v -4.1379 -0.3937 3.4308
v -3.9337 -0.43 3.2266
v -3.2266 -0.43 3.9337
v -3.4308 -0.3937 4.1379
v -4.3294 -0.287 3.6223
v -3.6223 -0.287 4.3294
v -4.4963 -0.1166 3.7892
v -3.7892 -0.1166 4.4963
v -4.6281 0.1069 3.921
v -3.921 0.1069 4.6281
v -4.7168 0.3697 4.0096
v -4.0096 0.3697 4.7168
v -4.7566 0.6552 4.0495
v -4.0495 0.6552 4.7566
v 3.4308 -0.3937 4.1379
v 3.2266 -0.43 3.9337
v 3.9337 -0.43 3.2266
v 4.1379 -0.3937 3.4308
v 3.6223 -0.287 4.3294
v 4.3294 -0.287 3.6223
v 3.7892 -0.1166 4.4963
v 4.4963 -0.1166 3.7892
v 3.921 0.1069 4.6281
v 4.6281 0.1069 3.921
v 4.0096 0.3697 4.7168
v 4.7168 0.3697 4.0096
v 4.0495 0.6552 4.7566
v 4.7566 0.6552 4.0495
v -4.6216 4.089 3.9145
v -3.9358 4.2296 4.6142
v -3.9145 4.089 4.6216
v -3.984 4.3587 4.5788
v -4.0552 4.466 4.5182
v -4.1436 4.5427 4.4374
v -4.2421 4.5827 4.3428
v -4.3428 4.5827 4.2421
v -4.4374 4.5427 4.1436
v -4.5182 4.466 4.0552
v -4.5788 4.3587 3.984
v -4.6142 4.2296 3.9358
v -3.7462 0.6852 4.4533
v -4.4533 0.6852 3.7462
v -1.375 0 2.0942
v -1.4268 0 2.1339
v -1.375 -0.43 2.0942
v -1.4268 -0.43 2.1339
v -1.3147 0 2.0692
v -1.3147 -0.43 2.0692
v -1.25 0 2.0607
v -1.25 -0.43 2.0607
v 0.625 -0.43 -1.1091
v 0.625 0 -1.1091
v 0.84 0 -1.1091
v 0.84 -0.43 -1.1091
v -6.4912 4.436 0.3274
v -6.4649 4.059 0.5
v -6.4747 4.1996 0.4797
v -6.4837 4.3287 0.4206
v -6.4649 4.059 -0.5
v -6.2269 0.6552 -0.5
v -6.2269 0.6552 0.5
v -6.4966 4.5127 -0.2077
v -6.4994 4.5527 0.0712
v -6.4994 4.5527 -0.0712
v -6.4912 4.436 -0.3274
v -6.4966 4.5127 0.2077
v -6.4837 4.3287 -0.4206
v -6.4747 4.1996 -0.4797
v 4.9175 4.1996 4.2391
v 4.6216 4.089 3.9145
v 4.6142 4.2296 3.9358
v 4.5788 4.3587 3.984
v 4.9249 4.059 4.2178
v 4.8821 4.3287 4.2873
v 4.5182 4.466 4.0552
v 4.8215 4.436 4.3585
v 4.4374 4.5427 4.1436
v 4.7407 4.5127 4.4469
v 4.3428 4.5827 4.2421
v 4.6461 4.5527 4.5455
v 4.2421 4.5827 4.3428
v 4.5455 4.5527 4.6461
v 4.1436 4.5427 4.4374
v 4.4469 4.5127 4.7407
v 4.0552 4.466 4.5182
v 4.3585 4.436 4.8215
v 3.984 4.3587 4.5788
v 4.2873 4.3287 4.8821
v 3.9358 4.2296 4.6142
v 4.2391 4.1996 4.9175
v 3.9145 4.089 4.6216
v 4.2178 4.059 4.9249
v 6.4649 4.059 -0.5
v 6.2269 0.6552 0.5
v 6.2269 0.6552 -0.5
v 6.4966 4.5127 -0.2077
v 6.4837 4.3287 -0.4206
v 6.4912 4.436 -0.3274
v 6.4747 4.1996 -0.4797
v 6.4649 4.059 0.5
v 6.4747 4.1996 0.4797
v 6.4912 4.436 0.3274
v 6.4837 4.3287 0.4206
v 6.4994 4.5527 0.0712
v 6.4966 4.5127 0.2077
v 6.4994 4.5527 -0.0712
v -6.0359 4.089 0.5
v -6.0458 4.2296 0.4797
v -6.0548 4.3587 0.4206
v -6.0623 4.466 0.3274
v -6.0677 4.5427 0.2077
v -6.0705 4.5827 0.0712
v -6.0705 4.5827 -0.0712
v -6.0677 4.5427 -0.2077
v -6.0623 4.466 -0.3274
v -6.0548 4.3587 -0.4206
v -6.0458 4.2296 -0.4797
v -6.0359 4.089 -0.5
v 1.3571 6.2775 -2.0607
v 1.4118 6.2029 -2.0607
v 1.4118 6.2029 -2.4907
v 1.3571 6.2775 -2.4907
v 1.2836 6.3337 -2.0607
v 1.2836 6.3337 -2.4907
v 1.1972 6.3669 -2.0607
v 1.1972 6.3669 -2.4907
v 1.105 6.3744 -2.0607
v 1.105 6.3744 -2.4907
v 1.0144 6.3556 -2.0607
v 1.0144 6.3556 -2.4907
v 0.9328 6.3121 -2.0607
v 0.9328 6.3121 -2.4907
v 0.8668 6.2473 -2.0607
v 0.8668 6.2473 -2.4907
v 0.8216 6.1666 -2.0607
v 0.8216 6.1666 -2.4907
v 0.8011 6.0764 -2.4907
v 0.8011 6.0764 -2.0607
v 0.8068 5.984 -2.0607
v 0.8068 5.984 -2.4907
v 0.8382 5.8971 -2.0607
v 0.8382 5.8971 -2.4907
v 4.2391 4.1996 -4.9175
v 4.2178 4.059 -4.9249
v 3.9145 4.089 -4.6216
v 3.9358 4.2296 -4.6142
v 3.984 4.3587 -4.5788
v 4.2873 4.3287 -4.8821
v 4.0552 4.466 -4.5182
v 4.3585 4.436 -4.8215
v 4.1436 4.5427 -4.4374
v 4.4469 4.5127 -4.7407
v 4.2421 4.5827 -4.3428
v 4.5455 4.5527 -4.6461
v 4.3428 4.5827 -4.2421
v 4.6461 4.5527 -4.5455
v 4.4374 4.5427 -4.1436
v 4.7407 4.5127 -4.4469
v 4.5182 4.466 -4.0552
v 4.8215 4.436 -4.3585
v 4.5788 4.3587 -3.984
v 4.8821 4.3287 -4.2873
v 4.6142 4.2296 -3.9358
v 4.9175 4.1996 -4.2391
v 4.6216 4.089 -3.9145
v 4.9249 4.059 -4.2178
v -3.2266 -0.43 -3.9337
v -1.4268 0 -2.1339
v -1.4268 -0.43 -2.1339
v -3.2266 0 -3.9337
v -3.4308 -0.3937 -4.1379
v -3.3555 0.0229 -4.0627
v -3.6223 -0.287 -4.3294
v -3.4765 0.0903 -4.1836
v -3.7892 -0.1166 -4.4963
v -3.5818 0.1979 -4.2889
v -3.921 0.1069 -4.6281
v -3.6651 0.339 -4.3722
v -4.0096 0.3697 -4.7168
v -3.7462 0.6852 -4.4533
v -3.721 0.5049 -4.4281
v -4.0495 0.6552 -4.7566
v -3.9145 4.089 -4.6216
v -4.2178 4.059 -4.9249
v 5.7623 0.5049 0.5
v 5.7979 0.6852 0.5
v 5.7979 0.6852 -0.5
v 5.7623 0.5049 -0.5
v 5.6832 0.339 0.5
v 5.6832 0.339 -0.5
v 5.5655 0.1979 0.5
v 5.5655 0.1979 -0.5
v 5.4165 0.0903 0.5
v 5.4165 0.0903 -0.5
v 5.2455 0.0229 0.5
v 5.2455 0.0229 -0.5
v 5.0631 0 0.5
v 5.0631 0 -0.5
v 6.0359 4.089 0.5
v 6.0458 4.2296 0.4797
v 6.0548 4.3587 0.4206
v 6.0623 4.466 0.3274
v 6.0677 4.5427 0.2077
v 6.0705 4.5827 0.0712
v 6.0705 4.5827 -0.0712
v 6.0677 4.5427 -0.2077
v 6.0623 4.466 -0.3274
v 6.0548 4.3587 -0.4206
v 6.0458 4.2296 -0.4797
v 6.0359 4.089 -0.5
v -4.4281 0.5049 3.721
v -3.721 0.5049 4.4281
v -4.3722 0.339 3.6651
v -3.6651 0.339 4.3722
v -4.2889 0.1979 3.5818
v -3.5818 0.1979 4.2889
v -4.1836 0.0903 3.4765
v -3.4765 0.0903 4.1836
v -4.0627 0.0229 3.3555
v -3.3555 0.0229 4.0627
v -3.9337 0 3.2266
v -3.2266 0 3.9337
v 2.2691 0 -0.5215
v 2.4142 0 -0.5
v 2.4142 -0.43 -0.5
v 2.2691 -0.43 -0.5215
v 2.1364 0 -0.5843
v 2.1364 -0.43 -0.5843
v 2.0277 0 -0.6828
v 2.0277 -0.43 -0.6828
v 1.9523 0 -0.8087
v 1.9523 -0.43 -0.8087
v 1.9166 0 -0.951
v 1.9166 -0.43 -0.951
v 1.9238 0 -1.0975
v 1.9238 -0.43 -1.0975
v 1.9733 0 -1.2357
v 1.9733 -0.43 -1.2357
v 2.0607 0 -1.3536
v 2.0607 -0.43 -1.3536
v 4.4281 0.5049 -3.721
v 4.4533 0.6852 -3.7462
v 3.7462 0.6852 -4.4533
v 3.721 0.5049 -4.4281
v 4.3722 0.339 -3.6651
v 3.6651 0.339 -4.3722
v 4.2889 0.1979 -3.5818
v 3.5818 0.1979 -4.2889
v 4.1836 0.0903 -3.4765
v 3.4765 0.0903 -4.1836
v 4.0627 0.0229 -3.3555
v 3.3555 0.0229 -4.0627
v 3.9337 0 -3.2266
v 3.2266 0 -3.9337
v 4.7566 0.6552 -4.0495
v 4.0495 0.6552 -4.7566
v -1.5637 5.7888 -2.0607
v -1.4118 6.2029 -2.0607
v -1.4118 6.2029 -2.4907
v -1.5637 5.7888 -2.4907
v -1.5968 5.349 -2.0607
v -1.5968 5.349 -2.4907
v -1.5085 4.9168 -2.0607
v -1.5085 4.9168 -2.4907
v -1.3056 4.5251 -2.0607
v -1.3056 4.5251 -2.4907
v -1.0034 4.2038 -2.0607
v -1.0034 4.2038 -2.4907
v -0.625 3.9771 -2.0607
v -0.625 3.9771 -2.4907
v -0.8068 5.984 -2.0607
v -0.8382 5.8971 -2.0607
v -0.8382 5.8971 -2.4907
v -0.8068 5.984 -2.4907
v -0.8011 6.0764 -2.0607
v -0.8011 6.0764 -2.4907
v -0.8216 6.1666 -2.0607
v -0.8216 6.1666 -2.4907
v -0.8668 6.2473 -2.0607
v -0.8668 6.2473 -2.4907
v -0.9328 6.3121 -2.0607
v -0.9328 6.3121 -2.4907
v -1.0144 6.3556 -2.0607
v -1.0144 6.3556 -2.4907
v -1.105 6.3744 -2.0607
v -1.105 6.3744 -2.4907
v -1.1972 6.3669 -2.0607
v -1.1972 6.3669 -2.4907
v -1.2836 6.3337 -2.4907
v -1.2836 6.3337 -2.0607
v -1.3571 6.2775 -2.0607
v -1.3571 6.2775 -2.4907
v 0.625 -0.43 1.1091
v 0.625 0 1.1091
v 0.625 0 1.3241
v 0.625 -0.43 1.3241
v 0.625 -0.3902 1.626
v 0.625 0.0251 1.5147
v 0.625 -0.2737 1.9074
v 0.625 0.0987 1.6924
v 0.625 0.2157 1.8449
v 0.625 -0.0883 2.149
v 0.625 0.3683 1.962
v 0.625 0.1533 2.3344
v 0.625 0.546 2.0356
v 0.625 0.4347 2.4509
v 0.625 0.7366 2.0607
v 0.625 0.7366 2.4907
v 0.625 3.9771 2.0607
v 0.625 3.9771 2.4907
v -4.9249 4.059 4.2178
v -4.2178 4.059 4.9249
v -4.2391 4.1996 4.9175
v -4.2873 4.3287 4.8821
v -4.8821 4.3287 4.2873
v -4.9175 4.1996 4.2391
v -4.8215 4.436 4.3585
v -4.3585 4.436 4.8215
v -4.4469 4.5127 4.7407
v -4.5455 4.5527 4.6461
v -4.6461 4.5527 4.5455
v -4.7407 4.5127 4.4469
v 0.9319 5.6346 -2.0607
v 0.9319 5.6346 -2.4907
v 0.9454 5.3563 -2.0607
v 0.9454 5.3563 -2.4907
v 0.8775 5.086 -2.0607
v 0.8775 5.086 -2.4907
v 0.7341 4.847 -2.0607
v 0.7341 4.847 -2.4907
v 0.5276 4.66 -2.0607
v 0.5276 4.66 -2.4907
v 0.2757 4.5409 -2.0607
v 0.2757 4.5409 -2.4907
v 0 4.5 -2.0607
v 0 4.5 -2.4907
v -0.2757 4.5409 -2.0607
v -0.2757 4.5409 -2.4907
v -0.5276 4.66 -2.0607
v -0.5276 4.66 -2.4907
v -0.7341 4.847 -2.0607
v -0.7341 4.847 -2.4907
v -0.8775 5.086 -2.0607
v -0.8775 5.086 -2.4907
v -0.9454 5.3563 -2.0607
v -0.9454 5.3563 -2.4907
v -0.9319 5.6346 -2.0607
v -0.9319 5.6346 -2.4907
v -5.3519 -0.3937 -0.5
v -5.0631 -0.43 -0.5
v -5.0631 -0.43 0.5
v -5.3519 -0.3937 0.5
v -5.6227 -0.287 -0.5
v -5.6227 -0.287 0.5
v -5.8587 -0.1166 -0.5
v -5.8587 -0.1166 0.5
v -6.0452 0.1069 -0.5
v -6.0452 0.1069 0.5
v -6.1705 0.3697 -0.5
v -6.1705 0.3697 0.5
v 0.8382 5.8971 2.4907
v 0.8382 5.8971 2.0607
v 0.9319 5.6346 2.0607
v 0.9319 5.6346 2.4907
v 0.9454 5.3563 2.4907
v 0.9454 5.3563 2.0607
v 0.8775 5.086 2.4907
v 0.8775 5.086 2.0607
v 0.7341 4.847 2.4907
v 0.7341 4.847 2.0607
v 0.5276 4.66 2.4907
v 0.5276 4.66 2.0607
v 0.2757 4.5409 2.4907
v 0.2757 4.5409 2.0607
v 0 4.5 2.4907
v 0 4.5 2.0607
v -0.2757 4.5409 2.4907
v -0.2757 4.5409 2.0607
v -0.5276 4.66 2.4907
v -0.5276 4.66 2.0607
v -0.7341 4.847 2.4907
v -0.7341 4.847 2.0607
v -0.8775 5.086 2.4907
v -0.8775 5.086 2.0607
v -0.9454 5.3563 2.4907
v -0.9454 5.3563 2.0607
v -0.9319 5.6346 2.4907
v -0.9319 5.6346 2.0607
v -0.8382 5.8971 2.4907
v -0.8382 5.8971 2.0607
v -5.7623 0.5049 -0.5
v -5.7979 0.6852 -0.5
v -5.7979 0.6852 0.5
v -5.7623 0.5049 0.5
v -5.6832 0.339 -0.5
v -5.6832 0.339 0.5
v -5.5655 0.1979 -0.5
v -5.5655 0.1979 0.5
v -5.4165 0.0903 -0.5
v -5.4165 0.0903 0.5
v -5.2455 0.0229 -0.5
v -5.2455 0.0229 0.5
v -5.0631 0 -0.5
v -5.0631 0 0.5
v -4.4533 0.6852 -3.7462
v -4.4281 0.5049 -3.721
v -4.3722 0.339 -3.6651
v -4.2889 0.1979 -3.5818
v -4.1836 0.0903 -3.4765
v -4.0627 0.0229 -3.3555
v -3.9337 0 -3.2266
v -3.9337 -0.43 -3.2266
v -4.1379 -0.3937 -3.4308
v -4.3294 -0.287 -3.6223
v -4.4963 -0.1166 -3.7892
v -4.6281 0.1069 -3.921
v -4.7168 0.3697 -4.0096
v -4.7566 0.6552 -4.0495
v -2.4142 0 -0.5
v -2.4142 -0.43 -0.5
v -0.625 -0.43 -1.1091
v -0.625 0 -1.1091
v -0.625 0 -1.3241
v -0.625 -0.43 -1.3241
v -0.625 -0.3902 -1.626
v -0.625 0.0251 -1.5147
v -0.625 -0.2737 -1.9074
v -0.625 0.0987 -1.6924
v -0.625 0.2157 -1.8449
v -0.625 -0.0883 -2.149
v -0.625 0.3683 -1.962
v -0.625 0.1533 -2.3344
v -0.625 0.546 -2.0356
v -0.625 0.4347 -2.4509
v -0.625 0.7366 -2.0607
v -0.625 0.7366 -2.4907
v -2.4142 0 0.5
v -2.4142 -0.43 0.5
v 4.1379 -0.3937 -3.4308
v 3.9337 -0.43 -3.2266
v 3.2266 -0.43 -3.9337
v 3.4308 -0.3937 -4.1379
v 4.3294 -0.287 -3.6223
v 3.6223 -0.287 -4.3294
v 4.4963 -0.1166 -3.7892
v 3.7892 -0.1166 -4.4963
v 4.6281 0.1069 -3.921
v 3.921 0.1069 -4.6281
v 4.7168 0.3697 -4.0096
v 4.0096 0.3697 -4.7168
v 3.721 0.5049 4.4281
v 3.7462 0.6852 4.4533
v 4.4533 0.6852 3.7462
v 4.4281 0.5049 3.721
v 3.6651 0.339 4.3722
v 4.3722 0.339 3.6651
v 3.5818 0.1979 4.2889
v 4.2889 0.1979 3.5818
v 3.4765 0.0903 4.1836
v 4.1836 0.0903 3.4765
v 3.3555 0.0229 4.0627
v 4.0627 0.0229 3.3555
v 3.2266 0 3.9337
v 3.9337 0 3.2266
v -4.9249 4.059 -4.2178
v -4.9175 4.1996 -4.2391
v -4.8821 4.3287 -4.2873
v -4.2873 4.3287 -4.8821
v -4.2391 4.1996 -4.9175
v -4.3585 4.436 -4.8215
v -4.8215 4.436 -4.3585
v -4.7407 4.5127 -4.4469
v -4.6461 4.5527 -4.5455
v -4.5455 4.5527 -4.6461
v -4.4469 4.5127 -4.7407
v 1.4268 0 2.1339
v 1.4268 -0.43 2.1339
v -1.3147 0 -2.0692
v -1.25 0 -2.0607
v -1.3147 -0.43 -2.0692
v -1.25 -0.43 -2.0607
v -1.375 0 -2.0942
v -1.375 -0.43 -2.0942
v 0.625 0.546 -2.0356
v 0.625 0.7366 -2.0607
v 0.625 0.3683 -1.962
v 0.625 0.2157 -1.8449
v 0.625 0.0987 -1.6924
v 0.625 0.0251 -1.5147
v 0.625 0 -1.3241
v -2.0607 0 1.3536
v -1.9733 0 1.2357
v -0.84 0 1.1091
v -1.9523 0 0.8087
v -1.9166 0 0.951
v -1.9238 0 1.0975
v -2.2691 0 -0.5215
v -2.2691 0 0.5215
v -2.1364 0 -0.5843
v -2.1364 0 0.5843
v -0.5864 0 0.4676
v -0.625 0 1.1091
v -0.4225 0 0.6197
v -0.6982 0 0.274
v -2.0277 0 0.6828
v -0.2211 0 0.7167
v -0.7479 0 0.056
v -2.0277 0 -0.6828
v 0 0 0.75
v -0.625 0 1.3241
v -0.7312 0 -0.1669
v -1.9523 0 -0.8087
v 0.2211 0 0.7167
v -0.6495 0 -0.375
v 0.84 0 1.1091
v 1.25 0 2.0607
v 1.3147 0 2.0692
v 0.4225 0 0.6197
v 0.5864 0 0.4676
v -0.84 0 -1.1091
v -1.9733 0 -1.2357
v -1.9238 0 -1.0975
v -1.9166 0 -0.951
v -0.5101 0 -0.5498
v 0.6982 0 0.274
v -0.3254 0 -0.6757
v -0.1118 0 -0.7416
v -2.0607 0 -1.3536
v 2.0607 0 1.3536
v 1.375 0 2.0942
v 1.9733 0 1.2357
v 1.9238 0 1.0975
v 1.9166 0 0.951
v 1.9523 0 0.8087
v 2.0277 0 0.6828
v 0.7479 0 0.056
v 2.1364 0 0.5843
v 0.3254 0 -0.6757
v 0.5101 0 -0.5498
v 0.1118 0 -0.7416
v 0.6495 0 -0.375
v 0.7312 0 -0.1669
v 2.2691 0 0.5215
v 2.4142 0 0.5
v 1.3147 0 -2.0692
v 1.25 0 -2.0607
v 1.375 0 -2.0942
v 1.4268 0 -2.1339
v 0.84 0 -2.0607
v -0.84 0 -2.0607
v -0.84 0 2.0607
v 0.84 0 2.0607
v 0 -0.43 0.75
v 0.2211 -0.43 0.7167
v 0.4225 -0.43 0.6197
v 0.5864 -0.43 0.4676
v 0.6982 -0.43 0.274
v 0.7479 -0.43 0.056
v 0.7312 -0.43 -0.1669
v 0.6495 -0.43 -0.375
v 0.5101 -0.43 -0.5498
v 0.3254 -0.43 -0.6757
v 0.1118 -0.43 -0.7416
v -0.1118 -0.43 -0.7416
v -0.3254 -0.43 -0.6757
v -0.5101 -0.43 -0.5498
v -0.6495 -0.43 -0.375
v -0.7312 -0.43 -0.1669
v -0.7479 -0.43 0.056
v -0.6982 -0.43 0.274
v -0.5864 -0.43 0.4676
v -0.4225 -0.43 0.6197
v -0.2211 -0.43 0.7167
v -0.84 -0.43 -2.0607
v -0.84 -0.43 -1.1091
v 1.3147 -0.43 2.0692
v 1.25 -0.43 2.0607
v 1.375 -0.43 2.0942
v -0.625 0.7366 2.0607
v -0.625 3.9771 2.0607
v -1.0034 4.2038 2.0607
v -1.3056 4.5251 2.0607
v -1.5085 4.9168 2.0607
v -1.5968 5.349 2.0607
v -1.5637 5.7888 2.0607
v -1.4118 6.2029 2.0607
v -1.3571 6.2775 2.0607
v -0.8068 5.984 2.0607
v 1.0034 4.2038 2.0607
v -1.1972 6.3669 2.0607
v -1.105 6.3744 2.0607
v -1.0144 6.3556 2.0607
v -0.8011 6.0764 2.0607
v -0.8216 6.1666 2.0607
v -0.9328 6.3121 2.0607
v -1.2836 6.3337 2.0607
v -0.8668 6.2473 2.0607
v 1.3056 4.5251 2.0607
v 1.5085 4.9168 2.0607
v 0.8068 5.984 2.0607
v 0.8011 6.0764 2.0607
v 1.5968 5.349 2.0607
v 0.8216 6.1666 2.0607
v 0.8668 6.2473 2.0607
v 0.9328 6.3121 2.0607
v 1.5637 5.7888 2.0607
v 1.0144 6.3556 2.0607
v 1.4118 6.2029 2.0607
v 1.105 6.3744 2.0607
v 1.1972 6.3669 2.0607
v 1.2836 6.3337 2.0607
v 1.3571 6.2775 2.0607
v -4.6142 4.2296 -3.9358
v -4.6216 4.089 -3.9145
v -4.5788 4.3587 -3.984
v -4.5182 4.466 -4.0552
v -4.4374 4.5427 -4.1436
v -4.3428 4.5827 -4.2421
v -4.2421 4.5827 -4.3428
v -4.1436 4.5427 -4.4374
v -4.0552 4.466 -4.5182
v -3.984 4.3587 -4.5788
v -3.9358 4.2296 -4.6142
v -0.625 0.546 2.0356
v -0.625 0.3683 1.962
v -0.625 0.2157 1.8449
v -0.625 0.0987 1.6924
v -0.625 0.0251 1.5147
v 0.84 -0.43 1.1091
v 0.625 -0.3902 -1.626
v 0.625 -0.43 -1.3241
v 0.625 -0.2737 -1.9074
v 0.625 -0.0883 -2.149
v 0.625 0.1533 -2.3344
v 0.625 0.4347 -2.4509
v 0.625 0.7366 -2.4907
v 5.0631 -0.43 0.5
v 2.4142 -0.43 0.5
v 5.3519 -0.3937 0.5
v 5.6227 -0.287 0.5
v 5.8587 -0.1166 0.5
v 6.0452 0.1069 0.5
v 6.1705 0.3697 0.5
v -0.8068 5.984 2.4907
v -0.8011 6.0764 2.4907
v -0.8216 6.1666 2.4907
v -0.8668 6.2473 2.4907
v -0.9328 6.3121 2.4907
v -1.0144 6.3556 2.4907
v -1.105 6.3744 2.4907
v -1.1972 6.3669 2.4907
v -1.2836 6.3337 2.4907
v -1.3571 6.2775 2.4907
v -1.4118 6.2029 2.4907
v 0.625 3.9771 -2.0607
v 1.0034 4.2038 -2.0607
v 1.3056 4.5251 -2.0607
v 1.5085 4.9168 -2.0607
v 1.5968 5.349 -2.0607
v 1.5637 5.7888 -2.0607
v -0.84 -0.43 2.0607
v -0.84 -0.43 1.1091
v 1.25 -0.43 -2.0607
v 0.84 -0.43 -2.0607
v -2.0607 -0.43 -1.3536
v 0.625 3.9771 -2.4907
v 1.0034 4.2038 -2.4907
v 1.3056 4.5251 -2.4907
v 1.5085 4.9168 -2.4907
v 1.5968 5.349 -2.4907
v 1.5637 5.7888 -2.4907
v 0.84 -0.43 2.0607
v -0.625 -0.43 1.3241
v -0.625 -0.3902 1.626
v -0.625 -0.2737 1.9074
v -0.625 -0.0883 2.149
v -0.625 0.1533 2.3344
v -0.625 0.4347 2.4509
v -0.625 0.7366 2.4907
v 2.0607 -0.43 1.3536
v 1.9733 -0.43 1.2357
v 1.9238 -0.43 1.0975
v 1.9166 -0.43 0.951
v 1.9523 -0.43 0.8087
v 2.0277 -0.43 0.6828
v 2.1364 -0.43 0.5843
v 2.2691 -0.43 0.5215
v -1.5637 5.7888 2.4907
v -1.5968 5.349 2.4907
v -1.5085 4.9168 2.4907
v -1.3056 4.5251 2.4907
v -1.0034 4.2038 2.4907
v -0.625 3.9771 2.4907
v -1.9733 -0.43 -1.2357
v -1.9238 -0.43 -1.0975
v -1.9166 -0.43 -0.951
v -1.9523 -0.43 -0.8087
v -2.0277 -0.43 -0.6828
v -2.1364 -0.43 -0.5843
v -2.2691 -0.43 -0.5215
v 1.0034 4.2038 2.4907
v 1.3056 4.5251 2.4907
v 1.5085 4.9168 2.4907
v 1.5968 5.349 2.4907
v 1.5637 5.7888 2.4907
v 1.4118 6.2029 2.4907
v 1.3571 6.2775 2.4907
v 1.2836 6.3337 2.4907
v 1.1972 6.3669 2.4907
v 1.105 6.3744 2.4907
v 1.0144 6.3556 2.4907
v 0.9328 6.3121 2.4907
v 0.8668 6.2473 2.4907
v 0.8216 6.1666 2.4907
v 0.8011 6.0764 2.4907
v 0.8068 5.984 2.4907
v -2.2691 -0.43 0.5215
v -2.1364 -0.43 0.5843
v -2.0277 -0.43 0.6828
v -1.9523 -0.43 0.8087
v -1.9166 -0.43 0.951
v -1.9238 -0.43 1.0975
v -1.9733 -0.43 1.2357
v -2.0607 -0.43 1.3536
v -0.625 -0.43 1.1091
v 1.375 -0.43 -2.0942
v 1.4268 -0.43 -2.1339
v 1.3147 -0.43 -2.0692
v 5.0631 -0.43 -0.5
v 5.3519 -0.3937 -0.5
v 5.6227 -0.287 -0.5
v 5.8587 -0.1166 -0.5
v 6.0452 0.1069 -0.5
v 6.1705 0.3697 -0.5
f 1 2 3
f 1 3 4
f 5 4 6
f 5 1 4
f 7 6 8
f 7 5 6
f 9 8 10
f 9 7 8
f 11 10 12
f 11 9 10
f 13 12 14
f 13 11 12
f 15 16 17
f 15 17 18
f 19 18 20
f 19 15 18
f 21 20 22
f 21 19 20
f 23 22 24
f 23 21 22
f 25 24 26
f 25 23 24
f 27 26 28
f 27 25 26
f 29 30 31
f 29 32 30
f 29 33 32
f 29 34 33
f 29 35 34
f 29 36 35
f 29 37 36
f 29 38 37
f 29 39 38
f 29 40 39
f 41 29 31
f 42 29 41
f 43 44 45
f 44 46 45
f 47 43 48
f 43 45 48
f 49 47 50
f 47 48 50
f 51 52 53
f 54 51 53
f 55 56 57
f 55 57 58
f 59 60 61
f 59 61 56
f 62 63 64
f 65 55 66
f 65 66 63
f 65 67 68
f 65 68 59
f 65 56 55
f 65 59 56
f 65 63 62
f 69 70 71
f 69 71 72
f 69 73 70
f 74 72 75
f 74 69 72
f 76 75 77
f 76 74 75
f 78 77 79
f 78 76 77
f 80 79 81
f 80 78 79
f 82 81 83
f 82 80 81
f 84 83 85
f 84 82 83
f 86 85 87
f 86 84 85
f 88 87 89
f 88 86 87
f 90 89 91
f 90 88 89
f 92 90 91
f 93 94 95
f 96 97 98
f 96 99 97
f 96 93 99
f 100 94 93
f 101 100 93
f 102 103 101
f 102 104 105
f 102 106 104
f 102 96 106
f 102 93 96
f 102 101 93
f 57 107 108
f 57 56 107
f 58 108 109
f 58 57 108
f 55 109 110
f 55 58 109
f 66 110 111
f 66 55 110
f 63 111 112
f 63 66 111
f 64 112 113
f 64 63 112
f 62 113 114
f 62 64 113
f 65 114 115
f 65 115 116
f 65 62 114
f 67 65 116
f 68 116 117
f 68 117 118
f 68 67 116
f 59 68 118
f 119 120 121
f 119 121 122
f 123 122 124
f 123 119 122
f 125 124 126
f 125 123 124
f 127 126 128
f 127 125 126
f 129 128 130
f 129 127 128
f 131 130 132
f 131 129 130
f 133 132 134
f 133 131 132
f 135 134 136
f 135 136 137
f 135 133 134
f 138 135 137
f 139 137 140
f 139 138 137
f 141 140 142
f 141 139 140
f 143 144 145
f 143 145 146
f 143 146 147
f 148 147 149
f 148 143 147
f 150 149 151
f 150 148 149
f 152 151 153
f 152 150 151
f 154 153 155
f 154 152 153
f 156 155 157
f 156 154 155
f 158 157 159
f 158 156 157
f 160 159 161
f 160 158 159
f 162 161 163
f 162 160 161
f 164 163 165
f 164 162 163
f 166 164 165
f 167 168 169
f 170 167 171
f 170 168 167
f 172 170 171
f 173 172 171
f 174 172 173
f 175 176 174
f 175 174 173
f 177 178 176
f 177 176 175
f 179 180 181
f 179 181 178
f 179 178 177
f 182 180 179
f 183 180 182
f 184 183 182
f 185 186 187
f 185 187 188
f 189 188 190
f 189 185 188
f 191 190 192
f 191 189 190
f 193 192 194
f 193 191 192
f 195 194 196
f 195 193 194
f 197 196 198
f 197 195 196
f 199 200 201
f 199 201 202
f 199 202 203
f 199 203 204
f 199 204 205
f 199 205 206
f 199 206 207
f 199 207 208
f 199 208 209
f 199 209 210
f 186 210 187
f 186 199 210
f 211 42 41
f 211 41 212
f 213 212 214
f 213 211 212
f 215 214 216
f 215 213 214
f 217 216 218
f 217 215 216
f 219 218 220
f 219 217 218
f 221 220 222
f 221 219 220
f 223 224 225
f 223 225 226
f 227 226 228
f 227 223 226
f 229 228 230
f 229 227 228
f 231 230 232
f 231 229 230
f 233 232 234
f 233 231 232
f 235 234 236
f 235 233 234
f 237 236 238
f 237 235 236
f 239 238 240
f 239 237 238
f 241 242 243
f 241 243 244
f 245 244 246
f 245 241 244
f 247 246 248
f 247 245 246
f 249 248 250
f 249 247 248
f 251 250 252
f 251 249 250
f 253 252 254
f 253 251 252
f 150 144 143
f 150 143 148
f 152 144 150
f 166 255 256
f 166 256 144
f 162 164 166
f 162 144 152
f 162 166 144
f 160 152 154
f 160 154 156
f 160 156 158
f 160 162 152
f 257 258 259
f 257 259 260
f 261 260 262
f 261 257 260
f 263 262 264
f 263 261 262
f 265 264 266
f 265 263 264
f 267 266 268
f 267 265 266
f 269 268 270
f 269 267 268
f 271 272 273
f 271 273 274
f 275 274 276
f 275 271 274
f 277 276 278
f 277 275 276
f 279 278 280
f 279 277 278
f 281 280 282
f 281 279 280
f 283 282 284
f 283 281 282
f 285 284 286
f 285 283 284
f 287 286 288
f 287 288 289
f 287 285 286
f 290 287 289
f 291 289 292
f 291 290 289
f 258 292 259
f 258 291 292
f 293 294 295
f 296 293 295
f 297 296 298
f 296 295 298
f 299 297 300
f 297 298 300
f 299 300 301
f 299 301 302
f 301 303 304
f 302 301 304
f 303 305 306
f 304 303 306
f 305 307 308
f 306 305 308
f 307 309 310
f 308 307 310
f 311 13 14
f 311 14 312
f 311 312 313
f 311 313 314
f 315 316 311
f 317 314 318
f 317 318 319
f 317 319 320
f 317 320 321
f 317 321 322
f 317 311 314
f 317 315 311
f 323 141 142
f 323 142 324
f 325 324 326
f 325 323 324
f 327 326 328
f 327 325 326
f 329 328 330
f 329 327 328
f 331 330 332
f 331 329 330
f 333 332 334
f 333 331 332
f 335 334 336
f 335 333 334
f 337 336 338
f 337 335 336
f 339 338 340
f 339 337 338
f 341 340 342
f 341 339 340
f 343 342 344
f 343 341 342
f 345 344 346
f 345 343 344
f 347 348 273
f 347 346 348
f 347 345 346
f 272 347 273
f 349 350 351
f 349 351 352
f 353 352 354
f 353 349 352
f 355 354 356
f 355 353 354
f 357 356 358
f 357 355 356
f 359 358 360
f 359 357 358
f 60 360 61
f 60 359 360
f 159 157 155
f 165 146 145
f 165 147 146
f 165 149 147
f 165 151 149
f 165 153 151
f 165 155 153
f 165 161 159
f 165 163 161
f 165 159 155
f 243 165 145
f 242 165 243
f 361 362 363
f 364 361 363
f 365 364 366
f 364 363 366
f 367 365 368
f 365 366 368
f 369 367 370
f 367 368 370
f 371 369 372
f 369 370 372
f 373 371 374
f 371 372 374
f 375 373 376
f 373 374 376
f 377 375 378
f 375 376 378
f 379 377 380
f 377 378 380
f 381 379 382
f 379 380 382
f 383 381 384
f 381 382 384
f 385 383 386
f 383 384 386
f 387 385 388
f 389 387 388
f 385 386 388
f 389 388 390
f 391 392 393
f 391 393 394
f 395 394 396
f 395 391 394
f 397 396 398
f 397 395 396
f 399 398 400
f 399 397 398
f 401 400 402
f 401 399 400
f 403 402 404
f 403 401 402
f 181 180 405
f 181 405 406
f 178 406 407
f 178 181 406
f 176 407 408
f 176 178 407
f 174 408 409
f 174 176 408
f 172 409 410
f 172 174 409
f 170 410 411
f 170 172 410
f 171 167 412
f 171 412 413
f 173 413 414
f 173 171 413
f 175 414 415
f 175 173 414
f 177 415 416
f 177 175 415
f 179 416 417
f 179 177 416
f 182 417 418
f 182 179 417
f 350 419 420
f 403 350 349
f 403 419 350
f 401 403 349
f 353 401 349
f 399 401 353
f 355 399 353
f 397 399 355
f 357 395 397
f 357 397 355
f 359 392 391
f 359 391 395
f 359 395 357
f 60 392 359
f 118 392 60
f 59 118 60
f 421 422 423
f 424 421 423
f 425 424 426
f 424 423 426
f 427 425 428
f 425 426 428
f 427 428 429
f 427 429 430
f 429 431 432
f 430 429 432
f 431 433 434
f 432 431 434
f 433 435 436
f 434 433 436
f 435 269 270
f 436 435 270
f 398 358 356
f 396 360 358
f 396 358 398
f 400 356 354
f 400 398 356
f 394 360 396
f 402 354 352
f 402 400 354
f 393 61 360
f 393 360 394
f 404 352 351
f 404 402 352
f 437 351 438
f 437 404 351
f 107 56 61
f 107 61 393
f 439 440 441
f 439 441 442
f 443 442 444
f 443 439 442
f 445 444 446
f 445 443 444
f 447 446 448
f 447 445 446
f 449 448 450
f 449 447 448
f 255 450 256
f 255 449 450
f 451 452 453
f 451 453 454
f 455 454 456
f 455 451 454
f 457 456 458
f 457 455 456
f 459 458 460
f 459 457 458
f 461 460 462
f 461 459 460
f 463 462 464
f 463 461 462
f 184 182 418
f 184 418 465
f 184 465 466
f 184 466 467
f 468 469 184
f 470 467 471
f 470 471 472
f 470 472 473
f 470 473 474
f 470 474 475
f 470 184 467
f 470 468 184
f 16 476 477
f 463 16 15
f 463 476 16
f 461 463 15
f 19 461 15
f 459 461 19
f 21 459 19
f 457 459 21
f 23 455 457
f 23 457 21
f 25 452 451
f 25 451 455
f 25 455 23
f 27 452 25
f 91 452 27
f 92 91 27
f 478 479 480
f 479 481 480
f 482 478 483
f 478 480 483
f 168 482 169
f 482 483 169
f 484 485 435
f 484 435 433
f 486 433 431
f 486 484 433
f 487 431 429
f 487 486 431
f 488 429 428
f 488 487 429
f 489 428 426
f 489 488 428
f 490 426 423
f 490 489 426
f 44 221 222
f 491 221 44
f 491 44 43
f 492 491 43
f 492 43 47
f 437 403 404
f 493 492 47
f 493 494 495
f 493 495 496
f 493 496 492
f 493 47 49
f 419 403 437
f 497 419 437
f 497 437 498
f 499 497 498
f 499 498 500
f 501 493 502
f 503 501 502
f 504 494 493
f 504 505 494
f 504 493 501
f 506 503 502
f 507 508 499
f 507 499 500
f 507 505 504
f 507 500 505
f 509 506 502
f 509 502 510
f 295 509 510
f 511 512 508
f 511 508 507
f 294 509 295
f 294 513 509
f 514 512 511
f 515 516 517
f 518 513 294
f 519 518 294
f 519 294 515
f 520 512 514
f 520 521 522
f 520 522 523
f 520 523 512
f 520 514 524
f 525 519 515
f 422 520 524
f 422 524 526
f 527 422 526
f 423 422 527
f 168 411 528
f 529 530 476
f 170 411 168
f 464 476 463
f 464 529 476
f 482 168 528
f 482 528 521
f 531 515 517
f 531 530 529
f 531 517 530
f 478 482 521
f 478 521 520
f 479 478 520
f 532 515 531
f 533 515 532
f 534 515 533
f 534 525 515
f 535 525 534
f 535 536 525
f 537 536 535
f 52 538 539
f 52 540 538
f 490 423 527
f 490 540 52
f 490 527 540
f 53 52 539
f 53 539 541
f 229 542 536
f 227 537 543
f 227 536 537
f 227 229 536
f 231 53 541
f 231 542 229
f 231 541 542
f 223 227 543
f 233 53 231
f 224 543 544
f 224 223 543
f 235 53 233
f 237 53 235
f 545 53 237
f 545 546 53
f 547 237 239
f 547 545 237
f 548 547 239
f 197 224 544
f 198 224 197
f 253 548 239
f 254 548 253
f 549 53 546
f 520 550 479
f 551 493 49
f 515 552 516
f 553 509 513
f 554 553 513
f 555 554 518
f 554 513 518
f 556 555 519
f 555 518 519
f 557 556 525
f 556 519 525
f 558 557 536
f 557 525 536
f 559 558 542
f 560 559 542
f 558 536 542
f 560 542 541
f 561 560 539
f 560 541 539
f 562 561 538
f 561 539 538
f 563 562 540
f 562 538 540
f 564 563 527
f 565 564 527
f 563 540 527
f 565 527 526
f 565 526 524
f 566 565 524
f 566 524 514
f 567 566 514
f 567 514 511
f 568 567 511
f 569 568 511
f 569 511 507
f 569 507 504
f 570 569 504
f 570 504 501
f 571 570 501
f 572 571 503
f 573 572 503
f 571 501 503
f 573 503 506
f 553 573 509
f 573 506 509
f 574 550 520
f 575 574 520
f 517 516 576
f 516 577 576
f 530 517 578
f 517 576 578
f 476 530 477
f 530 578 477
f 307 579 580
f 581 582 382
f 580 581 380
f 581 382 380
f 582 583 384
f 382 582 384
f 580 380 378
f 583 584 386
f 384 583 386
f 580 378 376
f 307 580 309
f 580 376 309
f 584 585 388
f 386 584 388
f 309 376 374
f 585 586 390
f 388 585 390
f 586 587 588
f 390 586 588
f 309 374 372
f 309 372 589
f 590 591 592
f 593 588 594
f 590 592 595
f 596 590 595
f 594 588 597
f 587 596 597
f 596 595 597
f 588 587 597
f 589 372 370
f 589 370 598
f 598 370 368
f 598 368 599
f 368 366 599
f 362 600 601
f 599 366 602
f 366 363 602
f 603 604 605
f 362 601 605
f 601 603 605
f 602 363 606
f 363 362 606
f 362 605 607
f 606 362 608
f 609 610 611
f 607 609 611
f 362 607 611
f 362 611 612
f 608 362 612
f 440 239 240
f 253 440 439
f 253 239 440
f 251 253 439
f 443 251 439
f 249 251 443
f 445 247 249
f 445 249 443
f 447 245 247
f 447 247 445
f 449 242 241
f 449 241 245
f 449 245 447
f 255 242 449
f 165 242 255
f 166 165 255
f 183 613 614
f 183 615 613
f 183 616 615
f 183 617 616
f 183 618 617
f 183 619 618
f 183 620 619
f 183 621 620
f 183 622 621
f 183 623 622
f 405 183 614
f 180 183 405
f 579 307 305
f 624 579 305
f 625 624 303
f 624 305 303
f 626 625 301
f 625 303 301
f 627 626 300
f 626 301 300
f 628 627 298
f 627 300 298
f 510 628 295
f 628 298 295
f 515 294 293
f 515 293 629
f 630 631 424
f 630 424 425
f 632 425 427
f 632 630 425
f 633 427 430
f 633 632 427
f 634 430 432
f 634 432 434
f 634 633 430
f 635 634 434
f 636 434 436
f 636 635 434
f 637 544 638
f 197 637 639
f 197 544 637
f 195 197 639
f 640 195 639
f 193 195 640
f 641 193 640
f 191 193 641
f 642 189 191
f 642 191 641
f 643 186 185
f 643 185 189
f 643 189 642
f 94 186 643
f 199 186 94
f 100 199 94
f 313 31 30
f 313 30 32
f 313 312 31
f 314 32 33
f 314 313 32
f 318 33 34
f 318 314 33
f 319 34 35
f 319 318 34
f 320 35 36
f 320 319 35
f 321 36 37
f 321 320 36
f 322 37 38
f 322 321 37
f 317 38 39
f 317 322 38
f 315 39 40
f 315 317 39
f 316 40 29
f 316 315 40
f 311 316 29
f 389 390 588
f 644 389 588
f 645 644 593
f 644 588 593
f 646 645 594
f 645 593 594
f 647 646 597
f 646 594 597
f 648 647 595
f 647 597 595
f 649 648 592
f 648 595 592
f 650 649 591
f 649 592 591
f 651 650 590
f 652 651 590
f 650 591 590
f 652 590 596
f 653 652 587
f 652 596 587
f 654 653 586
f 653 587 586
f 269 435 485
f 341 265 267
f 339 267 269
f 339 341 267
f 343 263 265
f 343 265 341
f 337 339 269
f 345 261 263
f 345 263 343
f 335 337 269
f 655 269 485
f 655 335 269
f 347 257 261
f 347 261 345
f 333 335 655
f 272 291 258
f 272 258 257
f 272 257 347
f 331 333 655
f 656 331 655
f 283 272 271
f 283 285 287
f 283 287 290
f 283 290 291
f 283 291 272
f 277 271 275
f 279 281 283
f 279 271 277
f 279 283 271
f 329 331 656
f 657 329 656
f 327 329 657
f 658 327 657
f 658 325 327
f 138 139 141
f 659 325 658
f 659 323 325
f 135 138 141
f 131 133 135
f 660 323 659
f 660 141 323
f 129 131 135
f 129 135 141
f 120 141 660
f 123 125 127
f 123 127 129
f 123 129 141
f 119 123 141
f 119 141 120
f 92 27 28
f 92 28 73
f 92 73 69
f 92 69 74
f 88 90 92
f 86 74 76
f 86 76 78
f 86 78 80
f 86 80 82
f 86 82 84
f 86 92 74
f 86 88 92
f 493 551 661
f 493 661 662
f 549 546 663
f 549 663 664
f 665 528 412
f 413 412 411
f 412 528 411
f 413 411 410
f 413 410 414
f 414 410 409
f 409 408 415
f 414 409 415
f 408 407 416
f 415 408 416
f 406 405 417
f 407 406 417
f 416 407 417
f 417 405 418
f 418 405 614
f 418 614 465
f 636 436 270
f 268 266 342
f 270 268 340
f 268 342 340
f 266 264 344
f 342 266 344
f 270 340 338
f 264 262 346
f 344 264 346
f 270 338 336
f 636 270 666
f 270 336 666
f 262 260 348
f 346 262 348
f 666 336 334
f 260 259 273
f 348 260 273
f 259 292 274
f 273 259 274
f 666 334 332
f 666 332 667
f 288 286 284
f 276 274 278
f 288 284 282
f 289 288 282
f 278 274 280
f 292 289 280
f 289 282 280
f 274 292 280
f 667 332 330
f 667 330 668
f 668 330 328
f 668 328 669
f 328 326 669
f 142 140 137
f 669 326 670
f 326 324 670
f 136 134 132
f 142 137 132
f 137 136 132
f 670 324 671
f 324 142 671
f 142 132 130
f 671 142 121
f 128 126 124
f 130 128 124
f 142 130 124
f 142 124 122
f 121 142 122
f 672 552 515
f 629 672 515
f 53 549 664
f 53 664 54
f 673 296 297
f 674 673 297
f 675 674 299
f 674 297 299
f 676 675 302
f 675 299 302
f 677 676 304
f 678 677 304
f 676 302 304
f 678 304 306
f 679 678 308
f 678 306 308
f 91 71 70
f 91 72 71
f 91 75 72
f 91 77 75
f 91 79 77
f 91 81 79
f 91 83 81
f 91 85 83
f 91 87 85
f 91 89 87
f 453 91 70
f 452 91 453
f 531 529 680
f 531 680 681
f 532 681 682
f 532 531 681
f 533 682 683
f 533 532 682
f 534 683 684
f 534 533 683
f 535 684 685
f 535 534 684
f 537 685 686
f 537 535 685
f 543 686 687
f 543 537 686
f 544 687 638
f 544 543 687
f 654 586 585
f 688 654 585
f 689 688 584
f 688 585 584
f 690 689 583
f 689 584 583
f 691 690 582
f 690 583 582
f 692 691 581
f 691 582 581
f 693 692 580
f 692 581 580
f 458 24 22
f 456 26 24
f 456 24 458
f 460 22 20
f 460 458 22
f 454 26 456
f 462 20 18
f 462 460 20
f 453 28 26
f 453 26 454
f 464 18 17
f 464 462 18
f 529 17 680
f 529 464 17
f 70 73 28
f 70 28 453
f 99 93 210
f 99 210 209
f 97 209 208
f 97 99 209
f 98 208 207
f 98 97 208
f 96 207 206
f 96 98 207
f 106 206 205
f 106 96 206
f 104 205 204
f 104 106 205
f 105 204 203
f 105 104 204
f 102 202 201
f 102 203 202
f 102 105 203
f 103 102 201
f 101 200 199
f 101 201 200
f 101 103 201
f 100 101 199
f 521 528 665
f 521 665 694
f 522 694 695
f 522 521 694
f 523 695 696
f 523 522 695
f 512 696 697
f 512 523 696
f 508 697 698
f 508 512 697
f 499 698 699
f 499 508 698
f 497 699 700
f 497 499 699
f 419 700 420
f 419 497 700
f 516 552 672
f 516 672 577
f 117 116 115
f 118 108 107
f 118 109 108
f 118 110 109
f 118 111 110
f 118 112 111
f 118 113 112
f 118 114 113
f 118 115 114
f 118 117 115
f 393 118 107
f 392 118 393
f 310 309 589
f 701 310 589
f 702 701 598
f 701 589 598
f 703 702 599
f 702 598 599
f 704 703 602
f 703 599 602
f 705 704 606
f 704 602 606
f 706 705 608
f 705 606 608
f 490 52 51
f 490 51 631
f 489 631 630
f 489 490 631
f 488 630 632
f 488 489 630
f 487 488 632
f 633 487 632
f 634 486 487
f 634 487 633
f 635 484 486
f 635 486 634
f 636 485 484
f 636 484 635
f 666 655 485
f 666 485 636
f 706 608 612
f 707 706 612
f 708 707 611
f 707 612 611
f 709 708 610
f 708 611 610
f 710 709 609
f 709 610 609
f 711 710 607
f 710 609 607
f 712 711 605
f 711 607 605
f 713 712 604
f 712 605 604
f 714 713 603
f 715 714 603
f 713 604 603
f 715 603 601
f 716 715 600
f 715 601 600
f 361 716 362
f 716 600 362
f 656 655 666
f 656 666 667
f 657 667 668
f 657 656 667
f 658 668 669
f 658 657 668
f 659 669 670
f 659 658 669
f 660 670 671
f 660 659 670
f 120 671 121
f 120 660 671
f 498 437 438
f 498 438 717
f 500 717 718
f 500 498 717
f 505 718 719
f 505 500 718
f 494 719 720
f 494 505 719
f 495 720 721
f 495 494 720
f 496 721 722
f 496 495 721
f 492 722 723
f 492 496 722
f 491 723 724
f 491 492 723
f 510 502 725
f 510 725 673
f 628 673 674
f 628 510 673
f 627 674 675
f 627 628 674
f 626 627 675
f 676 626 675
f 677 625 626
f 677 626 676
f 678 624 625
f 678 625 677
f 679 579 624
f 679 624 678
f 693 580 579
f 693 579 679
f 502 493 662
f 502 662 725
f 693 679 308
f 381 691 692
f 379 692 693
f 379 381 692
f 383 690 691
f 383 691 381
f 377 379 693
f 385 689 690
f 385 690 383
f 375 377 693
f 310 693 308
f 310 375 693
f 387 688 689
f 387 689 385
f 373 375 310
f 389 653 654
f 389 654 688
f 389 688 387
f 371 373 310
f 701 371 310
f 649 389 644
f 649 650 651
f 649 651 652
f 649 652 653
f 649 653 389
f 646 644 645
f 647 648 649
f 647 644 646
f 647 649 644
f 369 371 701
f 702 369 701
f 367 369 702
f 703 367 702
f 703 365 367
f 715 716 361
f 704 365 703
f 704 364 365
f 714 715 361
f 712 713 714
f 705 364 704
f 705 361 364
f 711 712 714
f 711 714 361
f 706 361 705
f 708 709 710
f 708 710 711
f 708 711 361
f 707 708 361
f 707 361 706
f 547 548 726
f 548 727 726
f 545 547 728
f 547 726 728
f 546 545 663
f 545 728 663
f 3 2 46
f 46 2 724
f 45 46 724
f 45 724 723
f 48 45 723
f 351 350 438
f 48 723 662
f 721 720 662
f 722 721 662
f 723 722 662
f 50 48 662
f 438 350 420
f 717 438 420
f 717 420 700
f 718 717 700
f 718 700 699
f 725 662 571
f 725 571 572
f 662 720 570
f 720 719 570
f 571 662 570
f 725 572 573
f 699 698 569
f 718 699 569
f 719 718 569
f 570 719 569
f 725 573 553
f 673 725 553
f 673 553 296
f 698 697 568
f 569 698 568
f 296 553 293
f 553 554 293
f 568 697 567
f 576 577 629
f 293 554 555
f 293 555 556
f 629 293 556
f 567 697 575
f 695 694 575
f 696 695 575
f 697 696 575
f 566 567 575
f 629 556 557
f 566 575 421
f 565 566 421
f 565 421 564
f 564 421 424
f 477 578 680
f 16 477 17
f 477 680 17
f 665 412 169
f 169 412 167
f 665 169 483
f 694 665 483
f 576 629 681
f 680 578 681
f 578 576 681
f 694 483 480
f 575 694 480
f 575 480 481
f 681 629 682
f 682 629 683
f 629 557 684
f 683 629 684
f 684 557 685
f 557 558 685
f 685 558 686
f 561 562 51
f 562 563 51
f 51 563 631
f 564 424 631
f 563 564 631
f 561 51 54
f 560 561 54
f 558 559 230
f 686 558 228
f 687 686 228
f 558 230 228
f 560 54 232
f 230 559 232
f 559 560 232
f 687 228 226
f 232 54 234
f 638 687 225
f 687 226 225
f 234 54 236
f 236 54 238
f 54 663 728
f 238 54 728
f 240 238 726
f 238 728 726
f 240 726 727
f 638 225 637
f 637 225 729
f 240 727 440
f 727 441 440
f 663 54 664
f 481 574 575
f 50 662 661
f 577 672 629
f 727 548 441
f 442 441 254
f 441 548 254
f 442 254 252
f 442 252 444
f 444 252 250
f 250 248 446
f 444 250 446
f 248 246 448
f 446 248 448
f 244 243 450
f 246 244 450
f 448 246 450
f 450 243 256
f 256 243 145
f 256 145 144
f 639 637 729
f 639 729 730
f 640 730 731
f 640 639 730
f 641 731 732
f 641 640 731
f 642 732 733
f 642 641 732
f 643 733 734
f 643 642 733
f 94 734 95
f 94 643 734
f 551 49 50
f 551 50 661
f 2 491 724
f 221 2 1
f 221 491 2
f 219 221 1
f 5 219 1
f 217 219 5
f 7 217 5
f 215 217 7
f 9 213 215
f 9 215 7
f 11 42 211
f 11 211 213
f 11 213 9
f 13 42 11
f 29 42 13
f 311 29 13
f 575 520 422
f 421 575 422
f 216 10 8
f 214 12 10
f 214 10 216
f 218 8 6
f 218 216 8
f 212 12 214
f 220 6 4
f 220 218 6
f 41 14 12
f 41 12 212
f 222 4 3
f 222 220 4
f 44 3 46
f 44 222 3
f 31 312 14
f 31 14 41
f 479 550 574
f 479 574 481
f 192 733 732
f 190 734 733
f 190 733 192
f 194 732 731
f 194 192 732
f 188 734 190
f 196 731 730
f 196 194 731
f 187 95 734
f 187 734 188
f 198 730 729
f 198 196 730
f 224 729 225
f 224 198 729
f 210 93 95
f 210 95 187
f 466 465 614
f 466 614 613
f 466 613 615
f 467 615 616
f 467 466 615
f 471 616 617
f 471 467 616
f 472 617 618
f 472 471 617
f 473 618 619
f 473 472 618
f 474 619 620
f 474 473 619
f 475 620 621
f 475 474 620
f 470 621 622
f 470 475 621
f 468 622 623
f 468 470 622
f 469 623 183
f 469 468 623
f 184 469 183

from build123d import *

# Parameters (mm, degrees)
SKETCH1_R                       = 0.75
BASE_FLANGE1_DEPTH              = 0.43
EDGE_FLANGE1_STRIP_CUT_DEPTH    = 1
EDGE_FLANGE1_DEPTH              = 1
FILLET1_RADIUS                  = 0.5
FILLET1_LENGTH                  = 0.43
CIRPATTERN1_COUNT               = 8
FILLET1_OF_CIRPATTERN1_2_RADIUS = 0.5
FILLET1_OF_CIRPATTERN1_2_LENGTH = 0.43
FILLET1_OF_CIRPATTERN1_3_RADIUS = 0.5
FILLET1_OF_CIRPATTERN1_3_LENGTH = 0.43
FILLET1_OF_CIRPATTERN1_4_RADIUS = 0.5
FILLET1_OF_CIRPATTERN1_4_LENGTH = 0.43
FILLET1_OF_CIRPATTERN1_5_RADIUS = 0.5
FILLET1_OF_CIRPATTERN1_5_LENGTH = 0.43
FILLET1_OF_CIRPATTERN1_6_RADIUS = 0.5
FILLET1_OF_CIRPATTERN1_6_LENGTH = 0.43
EDGE_FLANGE2_STRIP_W            = 3.1932
EDGE_FLANGE2_STRIP_H            = 0.43
EDGE_FLANGE2_STRIP_CUT_DEPTH    = 1.25
EDGE_FLANGE2_RELIEF_W           = 3.4082
EDGE_FLANGE2_RELIEF_H           = 0.215
EDGE_FLANGE2_RELIEF_CUT_DEPTH   = 0.43
EDGE_FLANGE2_DEPTH              = 1.25
TAB1_DEPTH                      = 0.43
FILLET2_R                       = 0.25


# Sheet-metal steps are written as plain solids
with BuildPart() as part:
    # Sketch1 → Base-Flange1 (new body)
    with BuildSketch(Plane(origin=(0, 0, 0), x_dir=(1, 0, 0), z_dir=(0, 1, 0))):
        with BuildLine():
            Line((5.75, 0.5), (2.414213562, 0.5))
            ThreePointArc((2.414213562, 0.5), (1.952273796, 0.808658284), (2.060660172, 1.353553391))
            Line((2.060660172, 1.353553391), (4.419417382, 3.712310601))
            Line((4.419417382, 3.712310601), (3.712310601, 4.419417382))
            Line((3.712310601, 4.419417382), (1.353553391, 2.060660172))
            Line((1.353553391, 2.060660172), (-1.353553391, 2.060660172))
            Line((-1.353553391, 2.060660172), (-3.712310601, 4.419417382))
            Line((-3.712310601, 4.419417382), (-4.419417382, 3.712310601))
            Line((-4.419417382, 3.712310601), (-2.060660172, 1.353553391))
            ThreePointArc((-2.060660172, 1.353553391), (-1.952273796, 0.808658284), (-2.414213562, 0.5))
            Line((-2.414213562, 0.5), (-5.75, 0.5))
            Line((-5.75, 0.5), (-5.75, -0.5))
            Line((-5.75, -0.5), (-2.414213562, -0.5))
            ThreePointArc((-2.414213562, -0.5), (-1.952273796, -0.808658284), (-2.060660172, -1.353553391))
            Line((-2.060660172, -1.353553391), (-4.419417382, -3.712310601))
            Line((-4.419417382, -3.712310601), (-3.712310601, -4.419417382))
            Line((-3.712310601, -4.419417382), (-1.353553391, -2.060660172))
            Line((-1.353553391, -2.060660172), (1.353553391, -2.060660172))
            Line((1.353553391, -2.060660172), (3.712310601, -4.419417382))
            Line((3.712310601, -4.419417382), (4.419417382, -3.712310601))
            Line((4.419417382, -3.712310601), (2.060660172, -1.353553391))
            ThreePointArc((2.060660172, -1.353553391), (1.952273796, -0.808658284), (2.414213562, -0.5))
            Line((2.414213562, -0.5), (5.75, -0.5))
            Line((5.75, -0.5), (5.75, 0.5))
        make_face()
        with Locations(Location((0, 0, 0), (0, 0, 270))):
            Circle(SKETCH1_R, mode=Mode.SUBTRACT)
    extrude(amount=-BASE_FLANGE1_DEPTH)

    # Edge-Flange1 strip (across the edge) → Edge-Flange1 strip cut (cut)
    with BuildSketch(Plane(origin=(4.419417382, 0, -3.712310601), x_dir=(-0.7053843046066381, 0.0697564737441289, 0.7053843046066409), z_dir=(-0.707106781186549, 0, -0.7071067811865462))):
        Polygon((-2.530199428, -0.254121237), (0.655222098, -0.476867609), (0.685217381, -0.047915067), (-2.500204144, 0.174831305), align=None)
    edge_flange1_strip_cut = extrude(amount=EDGE_FLANGE1_STRIP_CUT_DEPTH, mode=Mode.SUBTRACT)

    # Edge-Flange1 section (across the edge) → Edge-Flange1 (add)
    with BuildSketch(Plane(origin=(4.419417382, 0, -3.712310601), x_dir=(-0.7053843046066381, 0.0697564737441289, 0.7053843046066409), z_dir=(-0.707106781186549, 0, -0.7071067811865462))):
        with BuildLine():
            Line((-0.43, 0.686890612), (-0.43, 4.599018513))
            Line((-0.43, 4.599018513), (0, 4.599018513))
            Line((0, 4.599018513), (0, 0.686890612))
            ThreePointArc((0, 0.686890612), (0.197884863, 0.18453062), (0.685217381, -0.047915067))
            Line((0.685217381, -0.047915067), (0.655222098, -0.476867609))
            ThreePointArc((0.655222098, -0.476867609), (-0.116597228, -0.108728674), (-0.43, 0.686890612))
        make_face()
    edge_flange1 = extrude(amount=EDGE_FLANGE1_DEPTH)

    # Fillet1: full round fillet: the end face becomes a half cylinder, R = half its width
    fillet1_face = Plane((4.444369473, 4.572817893, -4.444369473), x_dir=(0.705384304607, -0.069756473744, -0.705384304607), z_dir=(0.049325275616, 0.99756405026, -0.049325275616))  # on the end face: x along it, z out of the body
    fillet1_slab = fillet1_face.offset(-FILLET1_RADIUS / 2) * Box(FILLET1_LENGTH, 2 * FILLET1_RADIUS, FILLET1_RADIUS, mode=Mode.PRIVATE)  # the body's end, R deep
    fillet1_round = Plane((4.419706835, 4.074035868, -4.419706835), x_dir=(0.049325275616, 0.99756405026, -0.049325275616), z_dir=(0.705384304607, -0.069756473744, -0.705384304607)) * Cylinder(FILLET1_RADIUS, FILLET1_LENGTH, mode=Mode.PRIVATE)  # its axis R under the face
    add(fillet1_slab - fillet1_round, mode=Mode.SUBTRACT)

    # CirPattern1: Edge-Flange1 strip cut, Edge-Flange1 ×8 about axis, 2 skipped
    cirpattern1_axis = Axis((0, -0.43, 0), (0, 1, 0))
    add([edge_flange1_strip_cut.rotate(cirpattern1_axis, i * 360 / CIRPATTERN1_COUNT) for i in range(1, CIRPATTERN1_COUNT) if i not in (1, 5)], mode=Mode.SUBTRACT)
    add([edge_flange1.rotate(cirpattern1_axis, i * 360 / CIRPATTERN1_COUNT) for i in range(1, CIRPATTERN1_COUNT) if i not in (1, 5)])

    # Fillet1 of CirPattern1 2: full round fillet: the end face becomes a half cylinder, R = half its width
    fillet1_of_cirpattern1_2_face = Plane((-4.444369473, 4.572817893, -4.444369473), x_dir=(-0.705384304607, -0.069756473744, -0.705384304607), z_dir=(-0.049325275616, 0.99756405026, -0.049325275616))  # on the end face: x along it, z out of the body
    fillet1_of_cirpattern1_2_slab = fillet1_of_cirpattern1_2_face.offset(-FILLET1_OF_CIRPATTERN1_2_RADIUS / 2) * Box(FILLET1_OF_CIRPATTERN1_2_LENGTH, 2 * FILLET1_OF_CIRPATTERN1_2_RADIUS, FILLET1_OF_CIRPATTERN1_2_RADIUS, mode=Mode.PRIVATE)  # the body's end, R deep
    fillet1_of_cirpattern1_2_round = Plane((-4.419706835, 4.074035868, -4.419706835), x_dir=(-0.049325275616, 0.99756405026, -0.049325275616), z_dir=(-0.705384304607, -0.069756473744, -0.705384304607)) * Cylinder(FILLET1_OF_CIRPATTERN1_2_RADIUS, FILLET1_OF_CIRPATTERN1_2_LENGTH, mode=Mode.PRIVATE)  # its axis R under the face
    add(fillet1_of_cirpattern1_2_slab - fillet1_of_cirpattern1_2_round, mode=Mode.SUBTRACT)

    # Fillet1 of CirPattern1 3: full round fillet: the end face becomes a half cylinder, R = half its width
    fillet1_of_cirpattern1_3_face = Plane((-6.285287585, 4.572817893, 0), x_dir=(-0.99756405026, -0.069756473744, 0), z_dir=(-0.069756473744, 0.99756405026, 0))  # on the end face: x along it, z out of the body
    fillet1_of_cirpattern1_3_slab = fillet1_of_cirpattern1_3_face.offset(-FILLET1_OF_CIRPATTERN1_3_RADIUS / 2) * Box(FILLET1_OF_CIRPATTERN1_3_LENGTH, 2 * FILLET1_OF_CIRPATTERN1_3_RADIUS, FILLET1_OF_CIRPATTERN1_3_RADIUS, mode=Mode.PRIVATE)  # the body's end, R deep
    fillet1_of_cirpattern1_3_round = Plane((-6.250409348, 4.074035868, 0), x_dir=(-0.069756473744, 0.99756405026, 0), z_dir=(-0.99756405026, -0.069756473744, 0)) * Cylinder(FILLET1_OF_CIRPATTERN1_3_RADIUS, FILLET1_OF_CIRPATTERN1_3_LENGTH, mode=Mode.PRIVATE)  # its axis R under the face
    add(fillet1_of_cirpattern1_3_slab - fillet1_of_cirpattern1_3_round, mode=Mode.SUBTRACT)

    # Fillet1 of CirPattern1 4: full round fillet: the end face becomes a half cylinder, R = half its width
    fillet1_of_cirpattern1_4_face = Plane((-4.444369473, 4.572817893, 4.444369473), x_dir=(-0.705384304607, -0.069756473744, 0.705384304607), z_dir=(-0.049325275616, 0.99756405026, 0.049325275616))  # on the end face: x along it, z out of the body
    fillet1_of_cirpattern1_4_slab = fillet1_of_cirpattern1_4_face.offset(-FILLET1_OF_CIRPATTERN1_4_RADIUS / 2) * Box(FILLET1_OF_CIRPATTERN1_4_LENGTH, 2 * FILLET1_OF_CIRPATTERN1_4_RADIUS, FILLET1_OF_CIRPATTERN1_4_RADIUS, mode=Mode.PRIVATE)  # the body's end, R deep
    fillet1_of_cirpattern1_4_round = Plane((-4.419706835, 4.074035868, 4.419706835), x_dir=(-0.049325275616, 0.99756405026, 0.049325275616), z_dir=(-0.705384304607, -0.069756473744, 0.705384304607)) * Cylinder(FILLET1_OF_CIRPATTERN1_4_RADIUS, FILLET1_OF_CIRPATTERN1_4_LENGTH, mode=Mode.PRIVATE)  # its axis R under the face
    add(fillet1_of_cirpattern1_4_slab - fillet1_of_cirpattern1_4_round, mode=Mode.SUBTRACT)

    # Fillet1 of CirPattern1 5: full round fillet: the end face becomes a half cylinder, R = half its width
    fillet1_of_cirpattern1_5_face = Plane((4.444369473, 4.572817893, 4.444369473), x_dir=(0.705384304607, -0.069756473744, 0.705384304607), z_dir=(0.049325275616, 0.99756405026, 0.049325275616))  # on the end face: x along it, z out of the body
    fillet1_of_cirpattern1_5_slab = fillet1_of_cirpattern1_5_face.offset(-FILLET1_OF_CIRPATTERN1_5_RADIUS / 2) * Box(FILLET1_OF_CIRPATTERN1_5_LENGTH, 2 * FILLET1_OF_CIRPATTERN1_5_RADIUS, FILLET1_OF_CIRPATTERN1_5_RADIUS, mode=Mode.PRIVATE)  # the body's end, R deep
    fillet1_of_cirpattern1_5_round = Plane((4.419706835, 4.074035868, 4.419706835), x_dir=(0.049325275616, 0.99756405026, 0.049325275616), z_dir=(0.705384304607, -0.069756473744, 0.705384304607)) * Cylinder(FILLET1_OF_CIRPATTERN1_5_RADIUS, FILLET1_OF_CIRPATTERN1_5_LENGTH, mode=Mode.PRIVATE)  # its axis R under the face
    add(fillet1_of_cirpattern1_5_slab - fillet1_of_cirpattern1_5_round, mode=Mode.SUBTRACT)

    # Fillet1 of CirPattern1 6: full round fillet: the end face becomes a half cylinder, R = half its width
    fillet1_of_cirpattern1_6_face = Plane((6.285287585, 4.572817893, 0), x_dir=(0.99756405026, -0.069756473744, 0), z_dir=(0.069756473744, 0.99756405026, 0))  # on the end face: x along it, z out of the body
    fillet1_of_cirpattern1_6_slab = fillet1_of_cirpattern1_6_face.offset(-FILLET1_OF_CIRPATTERN1_6_RADIUS / 2) * Box(FILLET1_OF_CIRPATTERN1_6_LENGTH, 2 * FILLET1_OF_CIRPATTERN1_6_RADIUS, FILLET1_OF_CIRPATTERN1_6_RADIUS, mode=Mode.PRIVATE)  # the body's end, R deep
    fillet1_of_cirpattern1_6_round = Plane((6.250409348, 4.074035868, 0), x_dir=(0.069756473744, 0.99756405026, 0), z_dir=(0.99756405026, -0.069756473744, 0)) * Cylinder(FILLET1_OF_CIRPATTERN1_6_RADIUS, FILLET1_OF_CIRPATTERN1_6_LENGTH, mode=Mode.PRIVATE)  # its axis R under the face
    add(fillet1_of_cirpattern1_6_slab - fillet1_of_cirpattern1_6_round, mode=Mode.SUBTRACT)

    # Edge-Flange2 strip (across the edge) → Edge-Flange2 strip cut (cut)
    with BuildSketch(Plane(origin=(0.625, 0, -2.060660172), x_dir=(0, 0, 1), z_dir=(-1, 0, 0))):
        with Locations((-0.86, -0.215)):
            Rectangle(EDGE_FLANGE2_STRIP_W, EDGE_FLANGE2_STRIP_H)
    edge_flange2_strip_cut = extrude(amount=EDGE_FLANGE2_STRIP_CUT_DEPTH, mode=Mode.SUBTRACT)

    # Edge-Flange2 relief (on the sheet) → Edge-Flange2 relief cut (cut)
    with BuildSketch(Plane(origin=(0.625, 0, -1.324060172), x_dir=(0, 0, 1), z_dir=(0, 1, 0))):
        with Locations((-1.4891, 0.1075)):
            Rectangle(EDGE_FLANGE2_RELIEF_W, EDGE_FLANGE2_RELIEF_H)
        with Locations((-1.4891, -1.3575)):
            Rectangle(EDGE_FLANGE2_RELIEF_W, EDGE_FLANGE2_RELIEF_H)
    edge_flange2_relief_cut = extrude(amount=-EDGE_FLANGE2_RELIEF_CUT_DEPTH, mode=Mode.SUBTRACT)

    # Edge-Flange2 section (across the edge) → Edge-Flange2 (add)
    with BuildSketch(Plane(origin=(0.625, 0, -2.060660172), x_dir=(0, 0, 1), z_dir=(-1, 0, 0))):
        with BuildLine():
            Line((-0.43, 0.7366), (-0.43, 4.5))
            Line((-0.43, 4.5), (0, 4.5))
            Line((0, 4.5), (0, 0.7366))
            ThreePointArc((0, 0.7366), (0.215745145, 0.215745145), (0.7366, 0))
            Line((0.7366, 0), (0.7366, -0.43))
            ThreePointArc((0.7366, -0.43), (-0.088310771, -0.088310771), (-0.43, 0.7366))
        make_face()
    edge_flange2 = extrude(amount=EDGE_FLANGE2_DEPTH)

    # Sketch13 → Tab1 (add)
    with BuildSketch(Plane.XY.offset(-2.060660172)):
        with BuildLine():
            ThreePointArc((-1.411764706, 6.202941176), (0, 3.85), (1.411764706, 6.202941176))
            ThreePointArc((1.411764706, 6.202941176), (0.972058824, 6.336764706), (0.838235294, 5.897058824))
            ThreePointArc((0.838235294, 5.897058824), (0, 4.5), (-0.838235294, 5.897058824))
            ThreePointArc((-0.838235294, 5.897058824), (-0.972058824, 6.336764706), (-1.411764706, 6.202941176))
        make_face()
    tab1 = extrude(amount=-TAB1_DEPTH)

    # Mirror1: Edge-Flange2 strip cut, Edge-Flange2 relief cut, Edge-Flange2, Tab1 across plane
    add(edge_flange2_strip_cut.mirror(Plane.XY), mode=Mode.SUBTRACT)
    add(edge_flange2_relief_cut.mirror(Plane.XY), mode=Mode.SUBTRACT)
    add(edge_flange2.mirror(Plane.XY))
    add(tab1.mirror(Plane.XY))

    # Fillet2
    fillet2_edges = [part.edges().sort_by_distance(p)[0] for p in [
        (1.353553391, -0.215, 2.060660172),
        (-1.353553391, -0.215, 2.060660172),
        (-1.353553391, -0.215, -2.060660172),
        (1.353553391, -0.215, -2.060660172),
    ]]
    fillet(fillet2_edges, radius=FILLET2_R)


solid = part.part
